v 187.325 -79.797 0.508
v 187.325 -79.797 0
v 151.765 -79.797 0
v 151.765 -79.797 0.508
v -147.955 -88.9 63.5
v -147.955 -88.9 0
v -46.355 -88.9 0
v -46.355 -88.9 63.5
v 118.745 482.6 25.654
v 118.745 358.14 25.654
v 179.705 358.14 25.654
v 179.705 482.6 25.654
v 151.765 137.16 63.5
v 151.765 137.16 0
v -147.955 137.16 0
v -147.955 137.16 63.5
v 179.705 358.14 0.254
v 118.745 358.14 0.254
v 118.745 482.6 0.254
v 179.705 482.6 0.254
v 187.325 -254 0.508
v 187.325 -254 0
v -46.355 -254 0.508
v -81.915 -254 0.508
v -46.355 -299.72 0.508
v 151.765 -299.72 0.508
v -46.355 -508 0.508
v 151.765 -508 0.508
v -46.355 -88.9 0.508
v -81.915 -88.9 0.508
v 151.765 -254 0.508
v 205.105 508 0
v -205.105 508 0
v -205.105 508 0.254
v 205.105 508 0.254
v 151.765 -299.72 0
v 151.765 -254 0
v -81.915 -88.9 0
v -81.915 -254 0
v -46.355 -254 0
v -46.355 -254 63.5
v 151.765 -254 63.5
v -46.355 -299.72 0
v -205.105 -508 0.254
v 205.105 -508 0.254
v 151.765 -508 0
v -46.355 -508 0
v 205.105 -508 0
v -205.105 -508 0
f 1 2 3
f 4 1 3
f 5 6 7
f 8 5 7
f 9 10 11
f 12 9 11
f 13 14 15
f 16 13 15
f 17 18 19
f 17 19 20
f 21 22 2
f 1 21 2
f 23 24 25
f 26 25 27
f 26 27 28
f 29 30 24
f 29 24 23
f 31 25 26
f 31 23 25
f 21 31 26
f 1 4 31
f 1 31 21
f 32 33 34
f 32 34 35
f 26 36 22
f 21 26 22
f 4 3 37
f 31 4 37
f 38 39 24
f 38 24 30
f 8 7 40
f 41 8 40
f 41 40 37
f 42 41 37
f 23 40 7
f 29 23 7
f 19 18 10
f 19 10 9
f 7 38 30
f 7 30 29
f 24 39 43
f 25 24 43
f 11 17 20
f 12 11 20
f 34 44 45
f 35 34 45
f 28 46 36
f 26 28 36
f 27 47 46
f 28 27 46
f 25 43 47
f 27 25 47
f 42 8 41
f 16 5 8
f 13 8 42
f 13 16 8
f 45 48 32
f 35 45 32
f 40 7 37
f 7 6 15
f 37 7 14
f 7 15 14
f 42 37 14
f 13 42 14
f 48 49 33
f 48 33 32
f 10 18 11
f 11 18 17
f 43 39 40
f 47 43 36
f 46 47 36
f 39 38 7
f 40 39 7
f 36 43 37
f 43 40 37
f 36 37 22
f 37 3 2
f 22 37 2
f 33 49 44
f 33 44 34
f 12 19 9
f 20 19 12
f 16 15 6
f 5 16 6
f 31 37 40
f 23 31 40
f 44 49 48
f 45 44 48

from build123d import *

# Parameters (mm, degrees)
F3_DEPTH = 63.5
F2_W     = 35.56
F2_H     = 165.1
F4_DEPTH = 0.508
F0_W     = 410.21
F0_H     = 1016
F5_DEPTH = 0.254
F6_W     = 60.96
F6_H     = 124.46
F7_DEPTH = 25.4


with BuildPart() as f3:
    # F2 (on face) → F3 (new body)
    with BuildSketch(Plane.XY):
        Polygon((151.765, -79.796955), (151.765, 137.16), (-147.955, 137.16), (-147.955, -88.9), (-81.915, -88.9), (-46.355, -88.9), (-46.355, -254), (151.765, -254), align=None)
    extrude(amount=F3_DEPTH)


with BuildPart() as f4:
    # F2 (on face) → F4 (new body)
    with BuildSketch(Plane.XY):
        with Locations((-64.135, -171.45)):
            Rectangle(F2_W, F2_H)
        Polygon((-46.355, -299.72), (-46.355, -254), (-81.915, -254), align=None)
        Polygon((151.765, -299.72), (151.765, -254), (-46.355, -254), (-46.355, -299.72), (-46.355, -508), (151.765, -508), align=None)
        Polygon((187.325, -79.796955), (151.765, -79.796955), (151.765, -254), (151.765, -299.72), (187.325, -254), align=None)
    extrude(amount=F4_DEPTH)


with BuildPart() as f5:
    # F0 (on Top) → F5 (new body)
    with BuildSketch(Plane.XY):
        Rectangle(F0_W, F0_H)
    extrude(amount=F5_DEPTH)


with BuildPart() as f7:
    # F6 (on face) → F7 (new body)
    with BuildSketch(Plane.XY.offset(0.254)):
        with Locations((149.225, 420.37)):
            Rectangle(F6_W, F6_H)
    extrude(amount=F7_DEPTH)


solid = Compound([f3.part, f4.part, f5.part, f7.part])
